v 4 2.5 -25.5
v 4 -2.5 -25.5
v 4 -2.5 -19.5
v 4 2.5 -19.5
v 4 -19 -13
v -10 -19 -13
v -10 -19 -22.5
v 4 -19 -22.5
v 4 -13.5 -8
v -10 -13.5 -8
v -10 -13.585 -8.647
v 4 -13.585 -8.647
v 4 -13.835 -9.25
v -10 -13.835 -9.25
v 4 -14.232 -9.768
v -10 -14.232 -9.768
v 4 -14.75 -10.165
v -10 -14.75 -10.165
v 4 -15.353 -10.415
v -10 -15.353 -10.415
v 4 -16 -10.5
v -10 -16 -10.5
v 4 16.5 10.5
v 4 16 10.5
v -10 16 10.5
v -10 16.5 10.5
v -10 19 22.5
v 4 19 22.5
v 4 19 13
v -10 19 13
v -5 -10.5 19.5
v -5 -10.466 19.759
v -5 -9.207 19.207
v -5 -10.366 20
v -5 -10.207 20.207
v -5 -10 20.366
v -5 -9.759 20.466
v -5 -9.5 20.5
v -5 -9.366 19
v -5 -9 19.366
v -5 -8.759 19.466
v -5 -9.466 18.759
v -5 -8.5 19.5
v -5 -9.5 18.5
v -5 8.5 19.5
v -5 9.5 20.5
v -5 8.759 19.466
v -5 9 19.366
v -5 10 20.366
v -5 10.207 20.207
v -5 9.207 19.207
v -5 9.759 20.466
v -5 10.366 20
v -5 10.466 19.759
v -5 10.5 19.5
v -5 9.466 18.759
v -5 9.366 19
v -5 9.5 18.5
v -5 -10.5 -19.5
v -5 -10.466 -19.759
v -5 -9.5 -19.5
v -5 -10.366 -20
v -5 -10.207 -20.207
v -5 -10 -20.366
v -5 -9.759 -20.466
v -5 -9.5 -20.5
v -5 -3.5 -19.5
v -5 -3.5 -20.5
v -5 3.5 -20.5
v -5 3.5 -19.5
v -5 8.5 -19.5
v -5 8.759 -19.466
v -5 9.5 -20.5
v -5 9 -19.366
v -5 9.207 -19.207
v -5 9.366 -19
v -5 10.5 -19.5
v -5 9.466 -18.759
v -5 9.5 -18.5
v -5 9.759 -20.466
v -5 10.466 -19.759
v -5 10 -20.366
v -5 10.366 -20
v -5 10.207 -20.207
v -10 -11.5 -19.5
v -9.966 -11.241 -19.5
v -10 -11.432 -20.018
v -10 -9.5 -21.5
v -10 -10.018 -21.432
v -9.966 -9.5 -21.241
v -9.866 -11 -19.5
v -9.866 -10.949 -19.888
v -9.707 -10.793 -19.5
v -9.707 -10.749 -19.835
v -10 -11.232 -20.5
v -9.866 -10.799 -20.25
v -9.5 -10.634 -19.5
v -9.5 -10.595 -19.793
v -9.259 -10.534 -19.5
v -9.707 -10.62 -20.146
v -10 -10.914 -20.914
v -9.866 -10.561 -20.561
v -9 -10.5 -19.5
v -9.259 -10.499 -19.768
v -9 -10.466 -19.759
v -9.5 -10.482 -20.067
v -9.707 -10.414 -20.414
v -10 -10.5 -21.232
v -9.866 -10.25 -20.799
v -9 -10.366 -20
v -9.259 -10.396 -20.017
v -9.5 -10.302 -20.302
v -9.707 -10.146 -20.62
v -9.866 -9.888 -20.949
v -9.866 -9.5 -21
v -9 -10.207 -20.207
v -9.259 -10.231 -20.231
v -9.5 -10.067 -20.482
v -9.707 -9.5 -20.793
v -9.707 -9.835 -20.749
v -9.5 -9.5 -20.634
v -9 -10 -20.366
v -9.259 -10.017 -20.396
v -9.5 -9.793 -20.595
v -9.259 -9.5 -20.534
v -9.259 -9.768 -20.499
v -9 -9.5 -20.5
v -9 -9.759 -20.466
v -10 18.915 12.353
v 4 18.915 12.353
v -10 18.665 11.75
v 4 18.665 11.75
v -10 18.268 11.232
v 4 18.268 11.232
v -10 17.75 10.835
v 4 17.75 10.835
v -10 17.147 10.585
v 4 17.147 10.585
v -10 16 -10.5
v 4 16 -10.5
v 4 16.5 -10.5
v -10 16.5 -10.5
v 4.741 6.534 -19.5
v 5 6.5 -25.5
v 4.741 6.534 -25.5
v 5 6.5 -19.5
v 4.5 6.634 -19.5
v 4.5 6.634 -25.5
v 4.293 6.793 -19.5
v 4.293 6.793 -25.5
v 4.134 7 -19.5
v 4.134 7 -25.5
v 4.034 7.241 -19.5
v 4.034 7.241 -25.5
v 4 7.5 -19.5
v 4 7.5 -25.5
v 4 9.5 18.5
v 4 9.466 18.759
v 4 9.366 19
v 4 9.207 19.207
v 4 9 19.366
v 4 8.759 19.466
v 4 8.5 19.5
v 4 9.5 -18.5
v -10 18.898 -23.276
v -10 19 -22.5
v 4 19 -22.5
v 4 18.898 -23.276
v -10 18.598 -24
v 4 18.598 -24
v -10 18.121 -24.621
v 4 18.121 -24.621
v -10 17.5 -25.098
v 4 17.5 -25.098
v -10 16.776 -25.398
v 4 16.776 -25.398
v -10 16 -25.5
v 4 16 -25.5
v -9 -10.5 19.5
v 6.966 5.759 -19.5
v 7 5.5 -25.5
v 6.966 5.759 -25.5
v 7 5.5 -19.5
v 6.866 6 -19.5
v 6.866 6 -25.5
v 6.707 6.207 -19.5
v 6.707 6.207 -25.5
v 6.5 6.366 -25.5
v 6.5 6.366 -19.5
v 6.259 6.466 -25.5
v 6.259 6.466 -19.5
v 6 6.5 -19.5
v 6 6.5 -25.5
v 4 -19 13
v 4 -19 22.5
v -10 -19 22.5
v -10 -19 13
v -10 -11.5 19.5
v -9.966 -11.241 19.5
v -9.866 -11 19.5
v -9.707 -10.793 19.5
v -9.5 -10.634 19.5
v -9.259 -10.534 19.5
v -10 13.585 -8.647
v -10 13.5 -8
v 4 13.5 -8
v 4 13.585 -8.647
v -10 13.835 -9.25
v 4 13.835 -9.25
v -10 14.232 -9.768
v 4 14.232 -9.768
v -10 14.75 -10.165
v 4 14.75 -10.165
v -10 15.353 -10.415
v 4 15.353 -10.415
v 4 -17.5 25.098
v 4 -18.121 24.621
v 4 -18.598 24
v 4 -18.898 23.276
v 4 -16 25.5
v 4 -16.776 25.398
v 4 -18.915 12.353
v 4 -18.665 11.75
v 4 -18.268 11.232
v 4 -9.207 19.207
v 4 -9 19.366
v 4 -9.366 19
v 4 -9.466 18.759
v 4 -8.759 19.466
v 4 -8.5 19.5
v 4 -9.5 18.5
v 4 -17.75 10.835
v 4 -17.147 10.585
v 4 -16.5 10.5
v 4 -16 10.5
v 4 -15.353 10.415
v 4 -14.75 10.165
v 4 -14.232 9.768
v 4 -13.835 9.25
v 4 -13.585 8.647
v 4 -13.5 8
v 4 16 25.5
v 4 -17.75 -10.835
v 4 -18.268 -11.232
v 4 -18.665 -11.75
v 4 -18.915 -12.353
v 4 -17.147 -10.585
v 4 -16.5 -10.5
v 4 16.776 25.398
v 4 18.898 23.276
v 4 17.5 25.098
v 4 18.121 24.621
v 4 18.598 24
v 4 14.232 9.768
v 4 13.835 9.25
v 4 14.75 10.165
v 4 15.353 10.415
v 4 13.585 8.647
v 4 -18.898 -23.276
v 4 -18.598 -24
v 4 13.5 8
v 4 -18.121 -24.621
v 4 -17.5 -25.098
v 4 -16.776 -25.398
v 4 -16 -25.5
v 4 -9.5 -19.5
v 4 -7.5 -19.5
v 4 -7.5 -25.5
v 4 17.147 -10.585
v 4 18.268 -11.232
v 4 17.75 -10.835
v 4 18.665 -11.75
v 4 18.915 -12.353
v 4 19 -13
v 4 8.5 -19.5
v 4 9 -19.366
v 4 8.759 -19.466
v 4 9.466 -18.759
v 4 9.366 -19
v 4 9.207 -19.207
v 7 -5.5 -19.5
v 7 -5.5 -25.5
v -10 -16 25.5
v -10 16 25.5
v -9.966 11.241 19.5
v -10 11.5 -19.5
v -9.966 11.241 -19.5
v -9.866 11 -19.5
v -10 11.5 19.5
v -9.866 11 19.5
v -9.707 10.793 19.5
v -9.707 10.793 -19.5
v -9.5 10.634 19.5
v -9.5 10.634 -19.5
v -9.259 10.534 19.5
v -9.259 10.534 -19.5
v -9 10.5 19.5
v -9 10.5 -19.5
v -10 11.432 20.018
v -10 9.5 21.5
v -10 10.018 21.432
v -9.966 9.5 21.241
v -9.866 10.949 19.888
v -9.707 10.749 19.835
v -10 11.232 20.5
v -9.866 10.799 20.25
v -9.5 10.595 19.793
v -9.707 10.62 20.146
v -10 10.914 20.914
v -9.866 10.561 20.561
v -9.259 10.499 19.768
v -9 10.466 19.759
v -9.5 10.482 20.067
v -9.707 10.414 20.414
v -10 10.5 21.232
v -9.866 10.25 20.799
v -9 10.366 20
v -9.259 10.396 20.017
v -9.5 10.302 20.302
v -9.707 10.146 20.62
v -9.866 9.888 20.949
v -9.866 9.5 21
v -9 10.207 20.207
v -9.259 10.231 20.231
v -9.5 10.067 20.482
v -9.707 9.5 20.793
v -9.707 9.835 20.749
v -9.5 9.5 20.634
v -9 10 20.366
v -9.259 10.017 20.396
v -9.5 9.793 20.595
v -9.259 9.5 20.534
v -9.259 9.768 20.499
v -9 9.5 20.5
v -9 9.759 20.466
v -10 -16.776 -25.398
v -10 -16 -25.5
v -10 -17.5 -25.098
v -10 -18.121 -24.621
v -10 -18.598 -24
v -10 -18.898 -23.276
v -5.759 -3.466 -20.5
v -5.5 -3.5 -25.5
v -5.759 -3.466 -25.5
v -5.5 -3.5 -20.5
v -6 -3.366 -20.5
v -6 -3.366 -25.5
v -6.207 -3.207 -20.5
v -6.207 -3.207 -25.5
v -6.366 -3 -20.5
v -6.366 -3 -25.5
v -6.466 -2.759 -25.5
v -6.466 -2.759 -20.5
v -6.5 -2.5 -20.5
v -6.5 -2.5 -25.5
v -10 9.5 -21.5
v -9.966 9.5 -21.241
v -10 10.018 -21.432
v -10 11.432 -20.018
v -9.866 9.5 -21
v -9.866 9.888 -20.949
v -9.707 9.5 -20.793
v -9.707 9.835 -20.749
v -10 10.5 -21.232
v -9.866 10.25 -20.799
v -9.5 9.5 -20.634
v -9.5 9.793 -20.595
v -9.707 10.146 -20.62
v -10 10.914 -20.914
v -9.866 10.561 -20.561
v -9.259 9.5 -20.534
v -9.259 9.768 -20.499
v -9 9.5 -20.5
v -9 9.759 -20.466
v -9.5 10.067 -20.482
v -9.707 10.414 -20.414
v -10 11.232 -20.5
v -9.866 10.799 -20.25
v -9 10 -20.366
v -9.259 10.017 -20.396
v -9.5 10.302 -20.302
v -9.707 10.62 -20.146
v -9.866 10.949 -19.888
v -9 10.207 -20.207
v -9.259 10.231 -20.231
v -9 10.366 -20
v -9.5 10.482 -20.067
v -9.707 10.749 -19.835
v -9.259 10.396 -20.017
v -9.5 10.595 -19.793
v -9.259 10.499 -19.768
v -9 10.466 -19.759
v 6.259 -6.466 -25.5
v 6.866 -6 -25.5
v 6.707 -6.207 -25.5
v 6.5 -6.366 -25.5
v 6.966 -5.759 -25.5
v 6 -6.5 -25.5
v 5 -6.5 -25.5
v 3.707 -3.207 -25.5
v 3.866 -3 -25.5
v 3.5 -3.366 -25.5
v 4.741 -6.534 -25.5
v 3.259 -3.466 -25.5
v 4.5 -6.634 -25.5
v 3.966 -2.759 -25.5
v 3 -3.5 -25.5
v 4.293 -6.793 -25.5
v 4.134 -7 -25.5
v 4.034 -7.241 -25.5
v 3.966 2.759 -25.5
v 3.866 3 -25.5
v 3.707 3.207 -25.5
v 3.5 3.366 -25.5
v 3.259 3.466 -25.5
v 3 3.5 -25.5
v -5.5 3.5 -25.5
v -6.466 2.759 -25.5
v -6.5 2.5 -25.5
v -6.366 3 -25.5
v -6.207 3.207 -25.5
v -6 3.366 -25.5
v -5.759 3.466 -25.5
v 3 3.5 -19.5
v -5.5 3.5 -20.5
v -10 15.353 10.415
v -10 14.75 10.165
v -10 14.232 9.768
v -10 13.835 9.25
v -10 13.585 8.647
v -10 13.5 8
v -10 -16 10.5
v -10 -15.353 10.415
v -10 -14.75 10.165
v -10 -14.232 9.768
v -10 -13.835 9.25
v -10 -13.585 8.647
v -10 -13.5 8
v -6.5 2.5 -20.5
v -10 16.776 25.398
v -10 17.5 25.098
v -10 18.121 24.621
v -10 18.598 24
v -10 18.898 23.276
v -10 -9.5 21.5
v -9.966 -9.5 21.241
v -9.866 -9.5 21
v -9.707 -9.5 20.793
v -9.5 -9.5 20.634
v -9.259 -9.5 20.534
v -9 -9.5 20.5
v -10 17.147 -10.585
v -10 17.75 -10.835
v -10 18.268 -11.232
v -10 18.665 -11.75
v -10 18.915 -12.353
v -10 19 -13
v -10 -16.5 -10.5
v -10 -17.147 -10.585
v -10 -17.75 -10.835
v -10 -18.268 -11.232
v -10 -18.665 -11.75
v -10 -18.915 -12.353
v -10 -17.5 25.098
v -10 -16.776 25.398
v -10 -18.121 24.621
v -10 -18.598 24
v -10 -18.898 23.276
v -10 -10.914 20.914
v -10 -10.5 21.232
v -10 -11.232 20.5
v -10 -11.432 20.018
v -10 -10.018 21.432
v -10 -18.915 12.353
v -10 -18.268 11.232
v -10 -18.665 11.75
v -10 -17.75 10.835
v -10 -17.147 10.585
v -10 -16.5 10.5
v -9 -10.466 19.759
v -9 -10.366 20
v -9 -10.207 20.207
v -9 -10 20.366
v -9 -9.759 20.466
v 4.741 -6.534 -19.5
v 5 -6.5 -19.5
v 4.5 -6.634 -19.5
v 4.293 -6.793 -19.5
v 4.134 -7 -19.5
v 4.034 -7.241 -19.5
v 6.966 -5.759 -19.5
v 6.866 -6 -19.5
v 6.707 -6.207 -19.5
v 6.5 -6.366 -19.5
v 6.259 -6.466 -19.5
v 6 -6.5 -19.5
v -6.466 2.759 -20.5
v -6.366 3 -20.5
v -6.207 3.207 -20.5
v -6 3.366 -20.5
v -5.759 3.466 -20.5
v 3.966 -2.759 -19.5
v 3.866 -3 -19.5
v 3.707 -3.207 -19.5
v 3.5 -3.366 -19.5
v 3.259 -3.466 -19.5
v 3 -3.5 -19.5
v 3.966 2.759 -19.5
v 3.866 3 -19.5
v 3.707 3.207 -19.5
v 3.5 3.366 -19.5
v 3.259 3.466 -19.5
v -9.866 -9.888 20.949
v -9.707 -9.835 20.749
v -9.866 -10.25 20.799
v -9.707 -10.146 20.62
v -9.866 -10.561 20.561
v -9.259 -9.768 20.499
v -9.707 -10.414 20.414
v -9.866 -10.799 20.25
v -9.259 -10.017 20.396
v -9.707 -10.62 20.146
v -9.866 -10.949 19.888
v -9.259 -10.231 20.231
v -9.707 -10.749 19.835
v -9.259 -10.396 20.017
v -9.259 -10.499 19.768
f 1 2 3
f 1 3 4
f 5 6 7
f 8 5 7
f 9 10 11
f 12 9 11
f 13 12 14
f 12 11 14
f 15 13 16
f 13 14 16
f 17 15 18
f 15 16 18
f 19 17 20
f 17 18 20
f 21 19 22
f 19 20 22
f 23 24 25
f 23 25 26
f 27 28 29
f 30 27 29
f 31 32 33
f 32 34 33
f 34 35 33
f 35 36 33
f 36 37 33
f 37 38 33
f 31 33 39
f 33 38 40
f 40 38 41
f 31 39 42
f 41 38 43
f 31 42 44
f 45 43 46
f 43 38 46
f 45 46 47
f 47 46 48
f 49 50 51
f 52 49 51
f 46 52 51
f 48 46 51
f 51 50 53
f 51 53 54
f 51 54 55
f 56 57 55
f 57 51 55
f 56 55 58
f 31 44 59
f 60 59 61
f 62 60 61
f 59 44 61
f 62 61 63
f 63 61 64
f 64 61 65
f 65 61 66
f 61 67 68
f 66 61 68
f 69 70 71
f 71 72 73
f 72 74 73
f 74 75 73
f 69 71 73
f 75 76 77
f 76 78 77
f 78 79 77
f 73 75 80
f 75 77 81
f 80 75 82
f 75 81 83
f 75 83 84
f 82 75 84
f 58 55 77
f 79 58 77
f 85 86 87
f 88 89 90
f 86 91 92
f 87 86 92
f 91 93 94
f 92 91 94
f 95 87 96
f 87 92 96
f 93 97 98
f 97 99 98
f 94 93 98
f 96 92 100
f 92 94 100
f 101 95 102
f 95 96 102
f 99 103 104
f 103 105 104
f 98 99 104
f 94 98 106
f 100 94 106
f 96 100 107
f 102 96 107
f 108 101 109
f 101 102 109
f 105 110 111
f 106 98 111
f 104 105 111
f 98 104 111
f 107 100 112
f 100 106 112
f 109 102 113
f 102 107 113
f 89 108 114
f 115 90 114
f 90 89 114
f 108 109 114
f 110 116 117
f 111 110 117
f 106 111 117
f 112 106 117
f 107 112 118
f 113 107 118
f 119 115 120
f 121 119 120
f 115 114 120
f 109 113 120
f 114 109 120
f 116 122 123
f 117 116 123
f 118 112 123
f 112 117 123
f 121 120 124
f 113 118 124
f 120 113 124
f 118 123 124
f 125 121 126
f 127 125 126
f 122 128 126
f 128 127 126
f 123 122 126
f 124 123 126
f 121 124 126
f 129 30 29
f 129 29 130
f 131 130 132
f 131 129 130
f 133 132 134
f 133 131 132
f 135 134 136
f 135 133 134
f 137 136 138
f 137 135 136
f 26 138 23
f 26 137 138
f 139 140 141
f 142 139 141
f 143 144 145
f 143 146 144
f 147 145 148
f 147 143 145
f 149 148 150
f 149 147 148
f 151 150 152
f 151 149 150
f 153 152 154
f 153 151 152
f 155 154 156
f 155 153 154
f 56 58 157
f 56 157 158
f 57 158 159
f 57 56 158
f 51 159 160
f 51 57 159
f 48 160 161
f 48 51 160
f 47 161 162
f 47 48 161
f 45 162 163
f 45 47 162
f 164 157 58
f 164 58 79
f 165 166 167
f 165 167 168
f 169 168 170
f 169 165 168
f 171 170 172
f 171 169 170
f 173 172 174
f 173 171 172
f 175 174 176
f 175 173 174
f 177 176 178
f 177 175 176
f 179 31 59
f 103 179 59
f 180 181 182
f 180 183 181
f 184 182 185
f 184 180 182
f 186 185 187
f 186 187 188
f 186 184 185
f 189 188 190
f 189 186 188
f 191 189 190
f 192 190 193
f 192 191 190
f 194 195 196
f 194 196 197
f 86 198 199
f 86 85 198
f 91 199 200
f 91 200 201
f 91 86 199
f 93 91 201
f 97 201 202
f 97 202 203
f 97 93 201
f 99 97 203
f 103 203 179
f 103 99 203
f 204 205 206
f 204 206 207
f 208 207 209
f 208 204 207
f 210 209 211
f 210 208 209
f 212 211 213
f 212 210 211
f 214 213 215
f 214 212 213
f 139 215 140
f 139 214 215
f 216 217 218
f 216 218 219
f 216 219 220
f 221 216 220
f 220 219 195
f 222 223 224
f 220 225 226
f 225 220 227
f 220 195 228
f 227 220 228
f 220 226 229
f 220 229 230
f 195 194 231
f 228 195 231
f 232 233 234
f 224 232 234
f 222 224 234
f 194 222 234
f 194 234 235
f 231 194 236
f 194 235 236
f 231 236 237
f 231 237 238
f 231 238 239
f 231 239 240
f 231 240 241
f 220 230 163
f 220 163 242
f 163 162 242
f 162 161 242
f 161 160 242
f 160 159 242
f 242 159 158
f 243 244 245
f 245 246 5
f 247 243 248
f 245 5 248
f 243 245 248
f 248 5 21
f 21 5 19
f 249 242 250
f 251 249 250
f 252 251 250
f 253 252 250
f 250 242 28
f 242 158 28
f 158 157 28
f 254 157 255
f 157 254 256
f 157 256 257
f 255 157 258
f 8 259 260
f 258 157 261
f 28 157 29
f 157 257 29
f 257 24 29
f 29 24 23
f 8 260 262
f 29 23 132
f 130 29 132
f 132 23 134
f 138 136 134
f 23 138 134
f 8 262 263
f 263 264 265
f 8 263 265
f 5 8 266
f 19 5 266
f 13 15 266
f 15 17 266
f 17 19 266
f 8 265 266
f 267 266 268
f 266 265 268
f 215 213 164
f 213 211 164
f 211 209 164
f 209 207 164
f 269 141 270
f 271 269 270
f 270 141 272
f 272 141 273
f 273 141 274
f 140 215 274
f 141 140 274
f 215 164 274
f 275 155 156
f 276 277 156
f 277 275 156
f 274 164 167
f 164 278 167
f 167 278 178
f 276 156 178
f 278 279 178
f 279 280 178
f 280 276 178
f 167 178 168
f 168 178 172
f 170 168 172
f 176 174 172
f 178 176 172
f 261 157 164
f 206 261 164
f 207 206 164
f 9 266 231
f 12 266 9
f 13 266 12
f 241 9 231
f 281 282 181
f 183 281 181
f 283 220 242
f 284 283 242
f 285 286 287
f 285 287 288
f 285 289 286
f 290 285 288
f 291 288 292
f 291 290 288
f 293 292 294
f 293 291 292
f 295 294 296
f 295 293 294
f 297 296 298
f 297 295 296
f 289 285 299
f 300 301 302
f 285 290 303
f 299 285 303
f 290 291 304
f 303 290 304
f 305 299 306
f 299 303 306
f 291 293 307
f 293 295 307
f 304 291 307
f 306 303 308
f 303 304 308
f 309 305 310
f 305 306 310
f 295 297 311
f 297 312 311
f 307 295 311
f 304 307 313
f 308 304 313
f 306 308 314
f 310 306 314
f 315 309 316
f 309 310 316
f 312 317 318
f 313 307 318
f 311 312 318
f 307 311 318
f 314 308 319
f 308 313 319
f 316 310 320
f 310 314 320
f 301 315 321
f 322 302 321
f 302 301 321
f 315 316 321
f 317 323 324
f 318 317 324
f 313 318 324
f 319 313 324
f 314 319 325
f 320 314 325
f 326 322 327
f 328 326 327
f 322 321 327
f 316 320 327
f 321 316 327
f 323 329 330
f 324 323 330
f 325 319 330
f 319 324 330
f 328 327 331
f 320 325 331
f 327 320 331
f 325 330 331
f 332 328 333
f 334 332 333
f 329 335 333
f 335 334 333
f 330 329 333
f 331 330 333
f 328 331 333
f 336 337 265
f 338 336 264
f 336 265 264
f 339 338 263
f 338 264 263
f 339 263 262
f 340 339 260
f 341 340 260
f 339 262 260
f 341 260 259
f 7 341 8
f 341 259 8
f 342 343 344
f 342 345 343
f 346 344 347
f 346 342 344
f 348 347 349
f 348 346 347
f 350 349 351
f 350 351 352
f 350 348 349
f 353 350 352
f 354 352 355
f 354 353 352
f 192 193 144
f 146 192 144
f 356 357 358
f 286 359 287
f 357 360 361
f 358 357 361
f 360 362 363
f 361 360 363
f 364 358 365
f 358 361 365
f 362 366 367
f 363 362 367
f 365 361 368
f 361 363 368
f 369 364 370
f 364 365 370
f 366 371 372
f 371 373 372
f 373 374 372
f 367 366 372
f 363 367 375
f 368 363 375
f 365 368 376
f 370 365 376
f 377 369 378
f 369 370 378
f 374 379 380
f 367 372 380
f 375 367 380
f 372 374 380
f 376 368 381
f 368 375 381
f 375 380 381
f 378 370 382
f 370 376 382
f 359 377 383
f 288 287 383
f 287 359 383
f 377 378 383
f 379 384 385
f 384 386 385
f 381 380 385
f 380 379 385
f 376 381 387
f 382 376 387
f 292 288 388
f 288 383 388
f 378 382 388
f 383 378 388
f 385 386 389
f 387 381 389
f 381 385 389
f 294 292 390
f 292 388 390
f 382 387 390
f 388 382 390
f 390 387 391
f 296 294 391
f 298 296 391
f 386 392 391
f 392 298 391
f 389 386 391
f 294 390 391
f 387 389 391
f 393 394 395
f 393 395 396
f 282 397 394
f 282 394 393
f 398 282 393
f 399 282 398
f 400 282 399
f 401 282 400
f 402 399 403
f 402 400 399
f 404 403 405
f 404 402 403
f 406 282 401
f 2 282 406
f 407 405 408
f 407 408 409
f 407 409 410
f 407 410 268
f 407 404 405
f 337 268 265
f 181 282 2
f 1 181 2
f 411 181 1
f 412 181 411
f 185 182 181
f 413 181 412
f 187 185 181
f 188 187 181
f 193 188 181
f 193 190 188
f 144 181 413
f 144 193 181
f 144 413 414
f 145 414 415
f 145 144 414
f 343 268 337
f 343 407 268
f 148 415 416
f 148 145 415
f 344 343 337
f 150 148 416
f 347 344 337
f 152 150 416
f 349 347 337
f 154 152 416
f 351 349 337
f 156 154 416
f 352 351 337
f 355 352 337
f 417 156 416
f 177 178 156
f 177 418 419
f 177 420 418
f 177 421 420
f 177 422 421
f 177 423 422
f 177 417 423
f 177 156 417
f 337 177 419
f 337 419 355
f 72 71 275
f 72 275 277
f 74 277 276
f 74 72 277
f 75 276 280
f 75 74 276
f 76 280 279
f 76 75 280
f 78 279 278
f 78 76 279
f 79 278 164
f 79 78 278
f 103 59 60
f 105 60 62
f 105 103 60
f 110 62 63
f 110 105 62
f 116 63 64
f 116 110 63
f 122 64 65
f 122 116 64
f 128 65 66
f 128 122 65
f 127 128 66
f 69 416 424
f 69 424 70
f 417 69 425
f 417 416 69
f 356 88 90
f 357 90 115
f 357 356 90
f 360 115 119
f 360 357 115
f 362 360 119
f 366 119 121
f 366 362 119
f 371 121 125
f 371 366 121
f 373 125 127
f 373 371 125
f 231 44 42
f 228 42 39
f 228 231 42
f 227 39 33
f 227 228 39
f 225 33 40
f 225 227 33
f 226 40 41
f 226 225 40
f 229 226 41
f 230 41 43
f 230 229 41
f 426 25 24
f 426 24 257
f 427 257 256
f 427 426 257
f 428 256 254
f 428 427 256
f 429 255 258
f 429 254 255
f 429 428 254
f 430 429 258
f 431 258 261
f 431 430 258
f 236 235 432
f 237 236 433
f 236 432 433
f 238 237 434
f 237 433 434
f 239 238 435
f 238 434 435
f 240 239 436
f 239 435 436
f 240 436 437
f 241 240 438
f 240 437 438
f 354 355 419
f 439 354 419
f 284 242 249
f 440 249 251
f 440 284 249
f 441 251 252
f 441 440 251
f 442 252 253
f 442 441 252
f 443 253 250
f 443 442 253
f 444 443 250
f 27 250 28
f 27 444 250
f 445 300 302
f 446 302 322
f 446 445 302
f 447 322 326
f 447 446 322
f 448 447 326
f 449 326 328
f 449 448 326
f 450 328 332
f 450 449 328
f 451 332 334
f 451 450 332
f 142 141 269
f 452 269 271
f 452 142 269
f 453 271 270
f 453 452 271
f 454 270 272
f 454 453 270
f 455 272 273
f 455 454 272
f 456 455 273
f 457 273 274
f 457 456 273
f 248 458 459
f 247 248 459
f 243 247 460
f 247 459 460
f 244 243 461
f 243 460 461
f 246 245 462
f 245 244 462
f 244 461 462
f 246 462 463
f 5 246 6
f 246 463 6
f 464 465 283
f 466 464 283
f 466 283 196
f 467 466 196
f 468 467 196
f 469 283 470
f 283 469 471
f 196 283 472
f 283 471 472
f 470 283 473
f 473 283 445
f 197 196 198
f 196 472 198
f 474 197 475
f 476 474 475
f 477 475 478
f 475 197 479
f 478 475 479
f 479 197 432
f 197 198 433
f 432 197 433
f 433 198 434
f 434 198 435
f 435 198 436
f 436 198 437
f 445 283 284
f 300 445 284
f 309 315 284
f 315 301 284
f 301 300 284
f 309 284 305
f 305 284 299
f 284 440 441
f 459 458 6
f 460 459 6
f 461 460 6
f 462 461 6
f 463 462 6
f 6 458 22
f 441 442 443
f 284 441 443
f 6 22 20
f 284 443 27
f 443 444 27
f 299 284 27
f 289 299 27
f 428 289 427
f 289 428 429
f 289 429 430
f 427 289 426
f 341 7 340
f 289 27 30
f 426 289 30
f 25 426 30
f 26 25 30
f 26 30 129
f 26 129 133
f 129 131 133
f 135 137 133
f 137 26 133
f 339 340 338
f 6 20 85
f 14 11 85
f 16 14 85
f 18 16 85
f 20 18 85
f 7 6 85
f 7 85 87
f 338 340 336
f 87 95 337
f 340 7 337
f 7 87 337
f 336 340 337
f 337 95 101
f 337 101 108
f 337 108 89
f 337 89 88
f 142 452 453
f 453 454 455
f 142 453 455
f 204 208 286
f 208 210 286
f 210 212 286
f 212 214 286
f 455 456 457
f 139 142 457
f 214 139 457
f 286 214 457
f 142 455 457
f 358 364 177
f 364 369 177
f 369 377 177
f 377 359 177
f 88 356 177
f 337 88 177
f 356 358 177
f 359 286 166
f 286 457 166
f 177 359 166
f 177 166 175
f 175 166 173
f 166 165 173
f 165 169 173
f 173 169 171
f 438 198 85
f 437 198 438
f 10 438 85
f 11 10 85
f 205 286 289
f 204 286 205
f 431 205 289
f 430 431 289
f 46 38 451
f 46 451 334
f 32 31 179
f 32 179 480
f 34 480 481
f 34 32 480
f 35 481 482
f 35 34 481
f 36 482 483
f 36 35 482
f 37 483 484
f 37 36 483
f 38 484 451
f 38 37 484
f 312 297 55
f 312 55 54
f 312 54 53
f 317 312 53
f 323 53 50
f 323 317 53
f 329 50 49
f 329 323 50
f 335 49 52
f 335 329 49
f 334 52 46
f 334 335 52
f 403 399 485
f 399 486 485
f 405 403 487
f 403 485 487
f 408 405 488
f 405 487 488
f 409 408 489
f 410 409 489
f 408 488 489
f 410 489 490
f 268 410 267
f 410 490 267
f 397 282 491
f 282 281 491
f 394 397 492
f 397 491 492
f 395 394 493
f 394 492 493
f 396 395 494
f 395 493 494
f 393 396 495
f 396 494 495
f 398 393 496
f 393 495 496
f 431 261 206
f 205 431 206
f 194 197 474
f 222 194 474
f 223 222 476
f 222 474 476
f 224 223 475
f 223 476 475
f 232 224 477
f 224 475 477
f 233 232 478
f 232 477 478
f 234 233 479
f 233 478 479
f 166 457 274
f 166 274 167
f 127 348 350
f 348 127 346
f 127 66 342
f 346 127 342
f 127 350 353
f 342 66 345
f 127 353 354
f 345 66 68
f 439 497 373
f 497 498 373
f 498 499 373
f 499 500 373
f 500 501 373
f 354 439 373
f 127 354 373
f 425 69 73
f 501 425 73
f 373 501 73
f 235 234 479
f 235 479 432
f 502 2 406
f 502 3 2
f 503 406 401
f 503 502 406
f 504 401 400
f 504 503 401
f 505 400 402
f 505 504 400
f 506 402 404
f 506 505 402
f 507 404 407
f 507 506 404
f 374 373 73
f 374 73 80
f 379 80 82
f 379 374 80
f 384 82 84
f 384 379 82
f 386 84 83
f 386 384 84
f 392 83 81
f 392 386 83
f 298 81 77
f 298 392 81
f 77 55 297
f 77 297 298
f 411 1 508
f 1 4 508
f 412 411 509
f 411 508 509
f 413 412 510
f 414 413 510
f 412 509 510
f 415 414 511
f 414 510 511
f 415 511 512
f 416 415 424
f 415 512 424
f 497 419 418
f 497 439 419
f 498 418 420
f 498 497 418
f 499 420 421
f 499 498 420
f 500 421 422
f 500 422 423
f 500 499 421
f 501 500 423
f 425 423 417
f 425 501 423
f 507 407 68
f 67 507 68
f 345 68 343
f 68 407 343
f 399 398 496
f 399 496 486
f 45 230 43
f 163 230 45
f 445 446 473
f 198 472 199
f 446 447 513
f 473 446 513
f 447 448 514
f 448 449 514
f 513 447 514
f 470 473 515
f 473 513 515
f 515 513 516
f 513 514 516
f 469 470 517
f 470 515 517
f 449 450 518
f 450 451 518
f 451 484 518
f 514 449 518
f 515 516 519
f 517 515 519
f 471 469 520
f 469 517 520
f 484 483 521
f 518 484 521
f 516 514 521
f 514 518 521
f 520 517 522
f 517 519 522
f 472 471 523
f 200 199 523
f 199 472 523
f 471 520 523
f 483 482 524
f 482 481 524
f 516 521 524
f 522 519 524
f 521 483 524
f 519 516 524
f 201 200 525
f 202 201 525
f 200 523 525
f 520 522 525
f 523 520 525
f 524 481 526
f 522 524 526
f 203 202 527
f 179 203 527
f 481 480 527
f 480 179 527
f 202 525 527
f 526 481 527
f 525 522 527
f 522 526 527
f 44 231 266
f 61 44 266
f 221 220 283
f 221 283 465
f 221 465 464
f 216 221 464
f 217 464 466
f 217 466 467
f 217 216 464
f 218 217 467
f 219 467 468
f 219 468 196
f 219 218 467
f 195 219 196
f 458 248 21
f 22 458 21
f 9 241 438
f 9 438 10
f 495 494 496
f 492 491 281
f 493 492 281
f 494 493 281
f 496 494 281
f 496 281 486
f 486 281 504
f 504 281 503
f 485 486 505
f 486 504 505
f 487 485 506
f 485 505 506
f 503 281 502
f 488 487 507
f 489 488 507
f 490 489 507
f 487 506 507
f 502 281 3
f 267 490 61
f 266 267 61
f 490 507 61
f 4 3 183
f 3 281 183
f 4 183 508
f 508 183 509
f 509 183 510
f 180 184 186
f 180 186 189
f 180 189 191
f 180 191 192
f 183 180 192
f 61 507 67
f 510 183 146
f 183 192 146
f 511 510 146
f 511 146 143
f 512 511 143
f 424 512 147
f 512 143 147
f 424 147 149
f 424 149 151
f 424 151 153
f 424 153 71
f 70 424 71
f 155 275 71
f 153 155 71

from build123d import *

# Parameters (mm, degrees)
SKETCH1_W                   = 51
SKETCH1_H                   = 38
SKETCH1_W_2                 = 41
SKETCH1_H_2                 = 21
MAIN_BODY_DEPTH             = 10
SKETCH2_W                   = 41
SKETCH2_H                   = 21
SKETCH2_W_2                 = 39
SKETCH2_H_2                 = 19
END_STOP_DEPTH              = 5
CONTOURING_R                = 1
SKETCH4_W                   = 21
SKETCH4_H                   = 5.5
CLEARANCE_MIDDLE_DEPTH      = 21
EDGE_CONTOURING_R           = 3
INNER_CONTOURING_R          = 2.5
FIT_CONTOURING_R            = 1
SKETCH5_W                   = 15.358498738
SKETCH5_H                   = 54.278463244
SINGLE_CUT_DEPTH            = 52
SKETCH6_W                   = 13
SKETCH6_H                   = 7
CLEARANCE_WIRE_DEPTH        = 6
SKETCH7_W                   = 3
SKETCH7_H                   = 13
WIRE_CAP_DEPTH              = 6
WIRE_CLEARANCE_CONTOURING_R = 1


with BuildPart() as part:
    # Sketch1 → Main Body (new body, symmetric)
    with BuildSketch(Plane(origin=(0, 0, 0), x_dir=(0, 0, -1), z_dir=(1, 0, 0))):
        Rectangle(SKETCH1_W, SKETCH1_H)
        Rectangle(SKETCH1_W_2, SKETCH1_H_2, mode=Mode.SUBTRACT)
    extrude(amount=MAIN_BODY_DEPTH, both=True)

    # Sketch2 → End Stop (add, symmetric)
    with BuildSketch(Plane(origin=(0, 0, 0), x_dir=(0, 0, -1), z_dir=(1, 0, 0))):
        Rectangle(SKETCH2_W, SKETCH2_H)
        Rectangle(SKETCH2_W_2, SKETCH2_H_2, mode=Mode.SUBTRACT)
    extrude(amount=END_STOP_DEPTH, both=True)

    # Contouring
    contouring_edges = [part.edges().sort_by_distance(p)[0] for p in [
        (7.5, 10.5, 20.5),
        (7.5, -10.5, 20.5),
        (7.5, -10.5, -20.5),
        (7.5, 10.5, -20.5),
        (-7.5, 10.5, -20.5),
        (-7.5, 10.5, 20.5),
        (-7.5, -10.5, -20.5),
        (-7.5, -10.5, 20.5),
        (0, 9.5, 19.5),
        (0, -9.5, 19.5),
        (0, 9.5, -19.5),
    ]]
    fillet(contouring_edges, radius=CONTOURING_R)

    # Sketch4 → Clearance - Middle (cut, through all)
    with BuildSketch(Plane(origin=(10, 0, 0), x_dir=(0, 0, -1), z_dir=(1, 0, 0))):
        with Locations((0, 16.25)):
            Rectangle(SKETCH4_W, SKETCH4_H)
        with Locations((0, -16.25)):
            Rectangle(SKETCH4_W, SKETCH4_H)
    extrude(amount=-CLEARANCE_MIDDLE_DEPTH, mode=Mode.SUBTRACT)

    # Edge Contouring
    edge_contouring_edges = [part.edges().sort_by_distance(p)[0] for p in [
        (0, 19, 25.5),
        (0, 19, -25.5),
        (0, -19, -25.5),
        (0, -19, 25.5),
    ]]
    fillet(edge_contouring_edges, radius=EDGE_CONTOURING_R)

    # Inner Contouring
    inner_contouring_edges = [part.edges().sort_by_distance(p)[0] for p in [
        (0, 13.5, 10.5),
        (0, 19, 10.5),
        (0, 19, -10.5),
        (0, 13.5, -10.5),
        (0, -19, -10.5),
        (0, -19, 10.5),
        (0, -13.5, 10.5),
        (0, -13.5, -10.5),
    ]]
    fillet(inner_contouring_edges, radius=INNER_CONTOURING_R)

    # Fit Contouring
    fit_contouring_edges = [part.edges().sort_by_distance(p)[0] for p in [
        (-10, -10.5, 0),
        (-10, 0, -20.5),
        (-10, 0, 20.5),
        (10, 0, -20.5),
        (10, 10.5, 0),
        (-10, 10.5, 0),
        (10, 0, 20.5),
        (10, -10.5, 0),
        (-10, -10.207106781, -20.207106781),
        (-10, -10.207106781, 20.207106781),
        (10, 10.207106781, -20.207106781),
        (-10, 10.207106781, -20.207106781),
        (-10, 10.207106781, 20.207106781),
        (10, 10.207106781, 20.207106781),
        (10, -10.207106781, 20.207106781),
        (10, -10.207106781, -20.207106781),
    ]]
    fillet(fit_contouring_edges, radius=FIT_CONTOURING_R)

    # Sketch5 → Single Cut (cut, through all)
    with BuildSketch(Plane(origin=(0, 0, -25.5), x_dir=(-1, 0, 0), z_dir=(0, 0, -1))):
        with Locations((-11.679249369, 0)):
            Rectangle(SKETCH5_W, SKETCH5_H)
    extrude(amount=-SINGLE_CUT_DEPTH, mode=Mode.SUBTRACT)

    # Sketch6 → Clearance - Wire (cut)
    with BuildSketch(Plane(origin=(0, 0, -25.5), x_dir=(-1, 0, 0), z_dir=(0, 0, -1))):
        Rectangle(SKETCH6_W, SKETCH6_H)
    extrude(amount=-CLEARANCE_WIRE_DEPTH, mode=Mode.SUBTRACT)

    # Sketch7 → Wire Cap (add)
    with BuildSketch(Plane(origin=(0, 0, -25.5), x_dir=(-1, 0, 0), z_dir=(0, 0, -1))):
        with Locations((-5.5, 0)):
            Rectangle(SKETCH7_W, SKETCH7_H)
    extrude(amount=-WIRE_CAP_DEPTH)

    # Wire Clearance Contouring
    wire_clearance_contouring_edges = [part.edges().sort_by_distance(p)[0] for p in [
        (4, -3.5, -22.5),
        (4, 3.5, -22.5),
        (-6.5, -3.5, -23),
        (-6.5, 3.5, -23),
        (4, 6.5, -22.5),
        (7, 6.5, -22.5),
        (7, -6.5, -22.5),
        (4, -6.5, -22.5),
    ]]
    fillet(wire_clearance_contouring_edges, radius=WIRE_CLEARANCE_CONTOURING_R)


solid = part.part
